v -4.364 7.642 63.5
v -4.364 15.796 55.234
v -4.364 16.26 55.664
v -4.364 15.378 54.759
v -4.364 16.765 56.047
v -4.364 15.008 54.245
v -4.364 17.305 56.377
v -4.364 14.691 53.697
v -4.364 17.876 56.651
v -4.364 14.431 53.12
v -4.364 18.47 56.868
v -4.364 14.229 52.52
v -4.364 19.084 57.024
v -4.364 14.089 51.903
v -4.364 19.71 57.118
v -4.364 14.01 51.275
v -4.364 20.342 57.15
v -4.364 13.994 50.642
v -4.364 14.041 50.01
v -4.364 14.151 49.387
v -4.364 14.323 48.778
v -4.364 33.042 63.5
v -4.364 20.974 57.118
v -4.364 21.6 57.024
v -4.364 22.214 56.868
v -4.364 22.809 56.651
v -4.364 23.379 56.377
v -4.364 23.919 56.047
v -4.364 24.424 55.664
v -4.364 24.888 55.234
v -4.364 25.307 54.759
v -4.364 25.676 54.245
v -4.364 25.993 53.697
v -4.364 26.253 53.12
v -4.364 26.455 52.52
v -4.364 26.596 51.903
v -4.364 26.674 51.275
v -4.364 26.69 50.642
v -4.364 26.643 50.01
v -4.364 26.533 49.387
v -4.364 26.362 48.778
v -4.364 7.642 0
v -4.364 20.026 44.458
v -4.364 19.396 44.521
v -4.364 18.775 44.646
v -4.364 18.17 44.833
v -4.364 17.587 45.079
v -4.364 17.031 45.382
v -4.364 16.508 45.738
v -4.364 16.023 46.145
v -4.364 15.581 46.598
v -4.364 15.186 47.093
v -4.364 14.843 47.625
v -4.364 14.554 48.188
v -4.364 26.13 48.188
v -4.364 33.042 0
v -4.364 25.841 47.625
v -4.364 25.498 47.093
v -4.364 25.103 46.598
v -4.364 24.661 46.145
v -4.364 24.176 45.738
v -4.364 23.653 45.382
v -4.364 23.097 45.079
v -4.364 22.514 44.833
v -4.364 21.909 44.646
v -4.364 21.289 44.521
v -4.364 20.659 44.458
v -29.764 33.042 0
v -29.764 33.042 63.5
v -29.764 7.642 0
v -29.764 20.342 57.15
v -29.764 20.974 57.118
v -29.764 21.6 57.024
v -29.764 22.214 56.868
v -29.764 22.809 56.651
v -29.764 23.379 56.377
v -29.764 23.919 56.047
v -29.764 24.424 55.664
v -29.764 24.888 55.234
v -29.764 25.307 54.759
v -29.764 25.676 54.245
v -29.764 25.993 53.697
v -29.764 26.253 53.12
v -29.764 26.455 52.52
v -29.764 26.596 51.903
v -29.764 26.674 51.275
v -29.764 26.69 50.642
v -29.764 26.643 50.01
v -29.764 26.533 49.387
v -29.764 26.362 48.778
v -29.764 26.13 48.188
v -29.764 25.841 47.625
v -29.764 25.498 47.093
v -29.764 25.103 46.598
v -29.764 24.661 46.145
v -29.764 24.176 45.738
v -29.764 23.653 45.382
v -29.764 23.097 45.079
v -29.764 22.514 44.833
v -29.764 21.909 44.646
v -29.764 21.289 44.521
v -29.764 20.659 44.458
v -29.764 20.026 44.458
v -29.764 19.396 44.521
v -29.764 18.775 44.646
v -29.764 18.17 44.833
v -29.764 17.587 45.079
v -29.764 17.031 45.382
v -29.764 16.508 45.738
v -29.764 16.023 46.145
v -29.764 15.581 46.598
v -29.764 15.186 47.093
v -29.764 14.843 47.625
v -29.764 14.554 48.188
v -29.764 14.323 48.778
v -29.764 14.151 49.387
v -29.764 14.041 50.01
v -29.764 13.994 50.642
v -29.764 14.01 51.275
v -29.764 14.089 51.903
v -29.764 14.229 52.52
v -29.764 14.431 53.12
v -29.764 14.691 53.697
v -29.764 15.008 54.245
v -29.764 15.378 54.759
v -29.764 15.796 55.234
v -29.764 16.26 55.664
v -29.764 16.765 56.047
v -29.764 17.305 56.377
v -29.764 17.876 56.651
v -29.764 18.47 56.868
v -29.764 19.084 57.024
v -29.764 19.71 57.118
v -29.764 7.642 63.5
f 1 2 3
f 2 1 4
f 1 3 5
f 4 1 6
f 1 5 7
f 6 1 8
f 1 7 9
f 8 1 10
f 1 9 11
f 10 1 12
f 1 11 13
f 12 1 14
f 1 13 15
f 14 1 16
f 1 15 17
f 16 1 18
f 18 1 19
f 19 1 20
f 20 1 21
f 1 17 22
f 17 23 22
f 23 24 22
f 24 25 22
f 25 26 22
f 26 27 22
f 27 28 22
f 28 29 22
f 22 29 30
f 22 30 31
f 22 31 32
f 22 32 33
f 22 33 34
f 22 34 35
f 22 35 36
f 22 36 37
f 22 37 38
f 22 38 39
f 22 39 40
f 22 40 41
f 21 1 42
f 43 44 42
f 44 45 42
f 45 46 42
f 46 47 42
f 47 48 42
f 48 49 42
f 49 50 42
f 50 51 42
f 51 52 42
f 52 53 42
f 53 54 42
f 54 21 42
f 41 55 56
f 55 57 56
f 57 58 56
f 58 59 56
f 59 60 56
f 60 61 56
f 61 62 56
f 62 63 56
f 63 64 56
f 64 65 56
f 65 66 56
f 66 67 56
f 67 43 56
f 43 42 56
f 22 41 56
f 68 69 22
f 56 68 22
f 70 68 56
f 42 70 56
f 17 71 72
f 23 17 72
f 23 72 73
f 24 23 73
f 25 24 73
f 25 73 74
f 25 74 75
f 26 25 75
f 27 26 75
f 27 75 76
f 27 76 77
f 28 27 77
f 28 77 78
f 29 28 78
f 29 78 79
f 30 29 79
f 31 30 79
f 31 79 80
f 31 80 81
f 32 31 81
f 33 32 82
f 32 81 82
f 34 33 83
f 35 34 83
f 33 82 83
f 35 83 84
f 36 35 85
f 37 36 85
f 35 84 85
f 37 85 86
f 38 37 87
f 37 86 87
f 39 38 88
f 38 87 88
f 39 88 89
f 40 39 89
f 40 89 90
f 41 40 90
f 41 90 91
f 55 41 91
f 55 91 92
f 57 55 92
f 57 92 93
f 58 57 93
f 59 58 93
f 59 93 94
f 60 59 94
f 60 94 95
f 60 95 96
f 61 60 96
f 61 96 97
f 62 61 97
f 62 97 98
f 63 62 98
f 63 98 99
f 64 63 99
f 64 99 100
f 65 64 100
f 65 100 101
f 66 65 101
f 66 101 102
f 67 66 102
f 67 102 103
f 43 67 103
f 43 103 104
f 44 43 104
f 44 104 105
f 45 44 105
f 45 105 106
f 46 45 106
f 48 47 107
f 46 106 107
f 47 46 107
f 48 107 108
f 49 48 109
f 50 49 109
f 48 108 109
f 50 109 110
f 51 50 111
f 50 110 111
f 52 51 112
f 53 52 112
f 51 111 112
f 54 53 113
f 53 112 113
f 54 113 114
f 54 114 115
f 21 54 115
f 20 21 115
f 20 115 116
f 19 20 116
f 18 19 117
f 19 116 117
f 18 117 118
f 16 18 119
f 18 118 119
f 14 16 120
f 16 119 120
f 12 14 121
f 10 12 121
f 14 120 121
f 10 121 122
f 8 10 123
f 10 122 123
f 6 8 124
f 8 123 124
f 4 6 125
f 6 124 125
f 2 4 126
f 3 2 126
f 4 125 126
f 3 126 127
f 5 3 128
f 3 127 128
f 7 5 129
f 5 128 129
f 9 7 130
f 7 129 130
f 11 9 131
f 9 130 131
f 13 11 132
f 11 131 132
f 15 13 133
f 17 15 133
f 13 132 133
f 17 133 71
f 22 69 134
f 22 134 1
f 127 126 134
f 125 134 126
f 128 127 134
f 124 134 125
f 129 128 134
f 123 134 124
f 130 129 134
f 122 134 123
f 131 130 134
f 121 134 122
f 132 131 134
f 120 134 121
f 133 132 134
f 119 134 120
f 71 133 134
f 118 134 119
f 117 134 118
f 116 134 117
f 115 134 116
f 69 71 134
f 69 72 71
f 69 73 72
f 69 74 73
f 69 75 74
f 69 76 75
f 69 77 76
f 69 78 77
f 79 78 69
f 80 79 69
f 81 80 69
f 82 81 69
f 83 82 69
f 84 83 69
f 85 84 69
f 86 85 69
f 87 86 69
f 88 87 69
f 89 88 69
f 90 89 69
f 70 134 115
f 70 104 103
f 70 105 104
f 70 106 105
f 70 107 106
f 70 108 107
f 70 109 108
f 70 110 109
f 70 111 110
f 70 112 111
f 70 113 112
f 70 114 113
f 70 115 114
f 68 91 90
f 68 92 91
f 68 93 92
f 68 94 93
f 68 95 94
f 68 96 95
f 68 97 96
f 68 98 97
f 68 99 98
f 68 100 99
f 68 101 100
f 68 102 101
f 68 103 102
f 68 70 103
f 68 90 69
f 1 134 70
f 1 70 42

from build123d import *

# Parameters (mm, degrees)
SKETCH1_W           = 25.4
SKETCH1_H           = 25.4
BOSS_EXTRUDE1_DEPTH = 63.5
SKETCH2_R           = 6.35
CUT_EXTRUDE1_DEPTH  = 26.4


with BuildPart() as part:
    # Sketch1 → Boss-Extrude1 (new body)
    with BuildSketch(Plane.XY):
        with Locations((-17.064491321, 20.342163666)):
            Rectangle(SKETCH1_W, SKETCH1_H)
    extrude(amount=BOSS_EXTRUDE1_DEPTH)

    # Sketch2 → Cut-Extrude1 (cut, through all)
    with BuildSketch(Plane.ZY.offset(29.764491321)):
        with Locations((50.8, 20.342163666)):
            Circle(SKETCH2_R)
    extrude(amount=-CUT_EXTRUDE1_DEPTH, mode=Mode.SUBTRACT)


solid = part.part
